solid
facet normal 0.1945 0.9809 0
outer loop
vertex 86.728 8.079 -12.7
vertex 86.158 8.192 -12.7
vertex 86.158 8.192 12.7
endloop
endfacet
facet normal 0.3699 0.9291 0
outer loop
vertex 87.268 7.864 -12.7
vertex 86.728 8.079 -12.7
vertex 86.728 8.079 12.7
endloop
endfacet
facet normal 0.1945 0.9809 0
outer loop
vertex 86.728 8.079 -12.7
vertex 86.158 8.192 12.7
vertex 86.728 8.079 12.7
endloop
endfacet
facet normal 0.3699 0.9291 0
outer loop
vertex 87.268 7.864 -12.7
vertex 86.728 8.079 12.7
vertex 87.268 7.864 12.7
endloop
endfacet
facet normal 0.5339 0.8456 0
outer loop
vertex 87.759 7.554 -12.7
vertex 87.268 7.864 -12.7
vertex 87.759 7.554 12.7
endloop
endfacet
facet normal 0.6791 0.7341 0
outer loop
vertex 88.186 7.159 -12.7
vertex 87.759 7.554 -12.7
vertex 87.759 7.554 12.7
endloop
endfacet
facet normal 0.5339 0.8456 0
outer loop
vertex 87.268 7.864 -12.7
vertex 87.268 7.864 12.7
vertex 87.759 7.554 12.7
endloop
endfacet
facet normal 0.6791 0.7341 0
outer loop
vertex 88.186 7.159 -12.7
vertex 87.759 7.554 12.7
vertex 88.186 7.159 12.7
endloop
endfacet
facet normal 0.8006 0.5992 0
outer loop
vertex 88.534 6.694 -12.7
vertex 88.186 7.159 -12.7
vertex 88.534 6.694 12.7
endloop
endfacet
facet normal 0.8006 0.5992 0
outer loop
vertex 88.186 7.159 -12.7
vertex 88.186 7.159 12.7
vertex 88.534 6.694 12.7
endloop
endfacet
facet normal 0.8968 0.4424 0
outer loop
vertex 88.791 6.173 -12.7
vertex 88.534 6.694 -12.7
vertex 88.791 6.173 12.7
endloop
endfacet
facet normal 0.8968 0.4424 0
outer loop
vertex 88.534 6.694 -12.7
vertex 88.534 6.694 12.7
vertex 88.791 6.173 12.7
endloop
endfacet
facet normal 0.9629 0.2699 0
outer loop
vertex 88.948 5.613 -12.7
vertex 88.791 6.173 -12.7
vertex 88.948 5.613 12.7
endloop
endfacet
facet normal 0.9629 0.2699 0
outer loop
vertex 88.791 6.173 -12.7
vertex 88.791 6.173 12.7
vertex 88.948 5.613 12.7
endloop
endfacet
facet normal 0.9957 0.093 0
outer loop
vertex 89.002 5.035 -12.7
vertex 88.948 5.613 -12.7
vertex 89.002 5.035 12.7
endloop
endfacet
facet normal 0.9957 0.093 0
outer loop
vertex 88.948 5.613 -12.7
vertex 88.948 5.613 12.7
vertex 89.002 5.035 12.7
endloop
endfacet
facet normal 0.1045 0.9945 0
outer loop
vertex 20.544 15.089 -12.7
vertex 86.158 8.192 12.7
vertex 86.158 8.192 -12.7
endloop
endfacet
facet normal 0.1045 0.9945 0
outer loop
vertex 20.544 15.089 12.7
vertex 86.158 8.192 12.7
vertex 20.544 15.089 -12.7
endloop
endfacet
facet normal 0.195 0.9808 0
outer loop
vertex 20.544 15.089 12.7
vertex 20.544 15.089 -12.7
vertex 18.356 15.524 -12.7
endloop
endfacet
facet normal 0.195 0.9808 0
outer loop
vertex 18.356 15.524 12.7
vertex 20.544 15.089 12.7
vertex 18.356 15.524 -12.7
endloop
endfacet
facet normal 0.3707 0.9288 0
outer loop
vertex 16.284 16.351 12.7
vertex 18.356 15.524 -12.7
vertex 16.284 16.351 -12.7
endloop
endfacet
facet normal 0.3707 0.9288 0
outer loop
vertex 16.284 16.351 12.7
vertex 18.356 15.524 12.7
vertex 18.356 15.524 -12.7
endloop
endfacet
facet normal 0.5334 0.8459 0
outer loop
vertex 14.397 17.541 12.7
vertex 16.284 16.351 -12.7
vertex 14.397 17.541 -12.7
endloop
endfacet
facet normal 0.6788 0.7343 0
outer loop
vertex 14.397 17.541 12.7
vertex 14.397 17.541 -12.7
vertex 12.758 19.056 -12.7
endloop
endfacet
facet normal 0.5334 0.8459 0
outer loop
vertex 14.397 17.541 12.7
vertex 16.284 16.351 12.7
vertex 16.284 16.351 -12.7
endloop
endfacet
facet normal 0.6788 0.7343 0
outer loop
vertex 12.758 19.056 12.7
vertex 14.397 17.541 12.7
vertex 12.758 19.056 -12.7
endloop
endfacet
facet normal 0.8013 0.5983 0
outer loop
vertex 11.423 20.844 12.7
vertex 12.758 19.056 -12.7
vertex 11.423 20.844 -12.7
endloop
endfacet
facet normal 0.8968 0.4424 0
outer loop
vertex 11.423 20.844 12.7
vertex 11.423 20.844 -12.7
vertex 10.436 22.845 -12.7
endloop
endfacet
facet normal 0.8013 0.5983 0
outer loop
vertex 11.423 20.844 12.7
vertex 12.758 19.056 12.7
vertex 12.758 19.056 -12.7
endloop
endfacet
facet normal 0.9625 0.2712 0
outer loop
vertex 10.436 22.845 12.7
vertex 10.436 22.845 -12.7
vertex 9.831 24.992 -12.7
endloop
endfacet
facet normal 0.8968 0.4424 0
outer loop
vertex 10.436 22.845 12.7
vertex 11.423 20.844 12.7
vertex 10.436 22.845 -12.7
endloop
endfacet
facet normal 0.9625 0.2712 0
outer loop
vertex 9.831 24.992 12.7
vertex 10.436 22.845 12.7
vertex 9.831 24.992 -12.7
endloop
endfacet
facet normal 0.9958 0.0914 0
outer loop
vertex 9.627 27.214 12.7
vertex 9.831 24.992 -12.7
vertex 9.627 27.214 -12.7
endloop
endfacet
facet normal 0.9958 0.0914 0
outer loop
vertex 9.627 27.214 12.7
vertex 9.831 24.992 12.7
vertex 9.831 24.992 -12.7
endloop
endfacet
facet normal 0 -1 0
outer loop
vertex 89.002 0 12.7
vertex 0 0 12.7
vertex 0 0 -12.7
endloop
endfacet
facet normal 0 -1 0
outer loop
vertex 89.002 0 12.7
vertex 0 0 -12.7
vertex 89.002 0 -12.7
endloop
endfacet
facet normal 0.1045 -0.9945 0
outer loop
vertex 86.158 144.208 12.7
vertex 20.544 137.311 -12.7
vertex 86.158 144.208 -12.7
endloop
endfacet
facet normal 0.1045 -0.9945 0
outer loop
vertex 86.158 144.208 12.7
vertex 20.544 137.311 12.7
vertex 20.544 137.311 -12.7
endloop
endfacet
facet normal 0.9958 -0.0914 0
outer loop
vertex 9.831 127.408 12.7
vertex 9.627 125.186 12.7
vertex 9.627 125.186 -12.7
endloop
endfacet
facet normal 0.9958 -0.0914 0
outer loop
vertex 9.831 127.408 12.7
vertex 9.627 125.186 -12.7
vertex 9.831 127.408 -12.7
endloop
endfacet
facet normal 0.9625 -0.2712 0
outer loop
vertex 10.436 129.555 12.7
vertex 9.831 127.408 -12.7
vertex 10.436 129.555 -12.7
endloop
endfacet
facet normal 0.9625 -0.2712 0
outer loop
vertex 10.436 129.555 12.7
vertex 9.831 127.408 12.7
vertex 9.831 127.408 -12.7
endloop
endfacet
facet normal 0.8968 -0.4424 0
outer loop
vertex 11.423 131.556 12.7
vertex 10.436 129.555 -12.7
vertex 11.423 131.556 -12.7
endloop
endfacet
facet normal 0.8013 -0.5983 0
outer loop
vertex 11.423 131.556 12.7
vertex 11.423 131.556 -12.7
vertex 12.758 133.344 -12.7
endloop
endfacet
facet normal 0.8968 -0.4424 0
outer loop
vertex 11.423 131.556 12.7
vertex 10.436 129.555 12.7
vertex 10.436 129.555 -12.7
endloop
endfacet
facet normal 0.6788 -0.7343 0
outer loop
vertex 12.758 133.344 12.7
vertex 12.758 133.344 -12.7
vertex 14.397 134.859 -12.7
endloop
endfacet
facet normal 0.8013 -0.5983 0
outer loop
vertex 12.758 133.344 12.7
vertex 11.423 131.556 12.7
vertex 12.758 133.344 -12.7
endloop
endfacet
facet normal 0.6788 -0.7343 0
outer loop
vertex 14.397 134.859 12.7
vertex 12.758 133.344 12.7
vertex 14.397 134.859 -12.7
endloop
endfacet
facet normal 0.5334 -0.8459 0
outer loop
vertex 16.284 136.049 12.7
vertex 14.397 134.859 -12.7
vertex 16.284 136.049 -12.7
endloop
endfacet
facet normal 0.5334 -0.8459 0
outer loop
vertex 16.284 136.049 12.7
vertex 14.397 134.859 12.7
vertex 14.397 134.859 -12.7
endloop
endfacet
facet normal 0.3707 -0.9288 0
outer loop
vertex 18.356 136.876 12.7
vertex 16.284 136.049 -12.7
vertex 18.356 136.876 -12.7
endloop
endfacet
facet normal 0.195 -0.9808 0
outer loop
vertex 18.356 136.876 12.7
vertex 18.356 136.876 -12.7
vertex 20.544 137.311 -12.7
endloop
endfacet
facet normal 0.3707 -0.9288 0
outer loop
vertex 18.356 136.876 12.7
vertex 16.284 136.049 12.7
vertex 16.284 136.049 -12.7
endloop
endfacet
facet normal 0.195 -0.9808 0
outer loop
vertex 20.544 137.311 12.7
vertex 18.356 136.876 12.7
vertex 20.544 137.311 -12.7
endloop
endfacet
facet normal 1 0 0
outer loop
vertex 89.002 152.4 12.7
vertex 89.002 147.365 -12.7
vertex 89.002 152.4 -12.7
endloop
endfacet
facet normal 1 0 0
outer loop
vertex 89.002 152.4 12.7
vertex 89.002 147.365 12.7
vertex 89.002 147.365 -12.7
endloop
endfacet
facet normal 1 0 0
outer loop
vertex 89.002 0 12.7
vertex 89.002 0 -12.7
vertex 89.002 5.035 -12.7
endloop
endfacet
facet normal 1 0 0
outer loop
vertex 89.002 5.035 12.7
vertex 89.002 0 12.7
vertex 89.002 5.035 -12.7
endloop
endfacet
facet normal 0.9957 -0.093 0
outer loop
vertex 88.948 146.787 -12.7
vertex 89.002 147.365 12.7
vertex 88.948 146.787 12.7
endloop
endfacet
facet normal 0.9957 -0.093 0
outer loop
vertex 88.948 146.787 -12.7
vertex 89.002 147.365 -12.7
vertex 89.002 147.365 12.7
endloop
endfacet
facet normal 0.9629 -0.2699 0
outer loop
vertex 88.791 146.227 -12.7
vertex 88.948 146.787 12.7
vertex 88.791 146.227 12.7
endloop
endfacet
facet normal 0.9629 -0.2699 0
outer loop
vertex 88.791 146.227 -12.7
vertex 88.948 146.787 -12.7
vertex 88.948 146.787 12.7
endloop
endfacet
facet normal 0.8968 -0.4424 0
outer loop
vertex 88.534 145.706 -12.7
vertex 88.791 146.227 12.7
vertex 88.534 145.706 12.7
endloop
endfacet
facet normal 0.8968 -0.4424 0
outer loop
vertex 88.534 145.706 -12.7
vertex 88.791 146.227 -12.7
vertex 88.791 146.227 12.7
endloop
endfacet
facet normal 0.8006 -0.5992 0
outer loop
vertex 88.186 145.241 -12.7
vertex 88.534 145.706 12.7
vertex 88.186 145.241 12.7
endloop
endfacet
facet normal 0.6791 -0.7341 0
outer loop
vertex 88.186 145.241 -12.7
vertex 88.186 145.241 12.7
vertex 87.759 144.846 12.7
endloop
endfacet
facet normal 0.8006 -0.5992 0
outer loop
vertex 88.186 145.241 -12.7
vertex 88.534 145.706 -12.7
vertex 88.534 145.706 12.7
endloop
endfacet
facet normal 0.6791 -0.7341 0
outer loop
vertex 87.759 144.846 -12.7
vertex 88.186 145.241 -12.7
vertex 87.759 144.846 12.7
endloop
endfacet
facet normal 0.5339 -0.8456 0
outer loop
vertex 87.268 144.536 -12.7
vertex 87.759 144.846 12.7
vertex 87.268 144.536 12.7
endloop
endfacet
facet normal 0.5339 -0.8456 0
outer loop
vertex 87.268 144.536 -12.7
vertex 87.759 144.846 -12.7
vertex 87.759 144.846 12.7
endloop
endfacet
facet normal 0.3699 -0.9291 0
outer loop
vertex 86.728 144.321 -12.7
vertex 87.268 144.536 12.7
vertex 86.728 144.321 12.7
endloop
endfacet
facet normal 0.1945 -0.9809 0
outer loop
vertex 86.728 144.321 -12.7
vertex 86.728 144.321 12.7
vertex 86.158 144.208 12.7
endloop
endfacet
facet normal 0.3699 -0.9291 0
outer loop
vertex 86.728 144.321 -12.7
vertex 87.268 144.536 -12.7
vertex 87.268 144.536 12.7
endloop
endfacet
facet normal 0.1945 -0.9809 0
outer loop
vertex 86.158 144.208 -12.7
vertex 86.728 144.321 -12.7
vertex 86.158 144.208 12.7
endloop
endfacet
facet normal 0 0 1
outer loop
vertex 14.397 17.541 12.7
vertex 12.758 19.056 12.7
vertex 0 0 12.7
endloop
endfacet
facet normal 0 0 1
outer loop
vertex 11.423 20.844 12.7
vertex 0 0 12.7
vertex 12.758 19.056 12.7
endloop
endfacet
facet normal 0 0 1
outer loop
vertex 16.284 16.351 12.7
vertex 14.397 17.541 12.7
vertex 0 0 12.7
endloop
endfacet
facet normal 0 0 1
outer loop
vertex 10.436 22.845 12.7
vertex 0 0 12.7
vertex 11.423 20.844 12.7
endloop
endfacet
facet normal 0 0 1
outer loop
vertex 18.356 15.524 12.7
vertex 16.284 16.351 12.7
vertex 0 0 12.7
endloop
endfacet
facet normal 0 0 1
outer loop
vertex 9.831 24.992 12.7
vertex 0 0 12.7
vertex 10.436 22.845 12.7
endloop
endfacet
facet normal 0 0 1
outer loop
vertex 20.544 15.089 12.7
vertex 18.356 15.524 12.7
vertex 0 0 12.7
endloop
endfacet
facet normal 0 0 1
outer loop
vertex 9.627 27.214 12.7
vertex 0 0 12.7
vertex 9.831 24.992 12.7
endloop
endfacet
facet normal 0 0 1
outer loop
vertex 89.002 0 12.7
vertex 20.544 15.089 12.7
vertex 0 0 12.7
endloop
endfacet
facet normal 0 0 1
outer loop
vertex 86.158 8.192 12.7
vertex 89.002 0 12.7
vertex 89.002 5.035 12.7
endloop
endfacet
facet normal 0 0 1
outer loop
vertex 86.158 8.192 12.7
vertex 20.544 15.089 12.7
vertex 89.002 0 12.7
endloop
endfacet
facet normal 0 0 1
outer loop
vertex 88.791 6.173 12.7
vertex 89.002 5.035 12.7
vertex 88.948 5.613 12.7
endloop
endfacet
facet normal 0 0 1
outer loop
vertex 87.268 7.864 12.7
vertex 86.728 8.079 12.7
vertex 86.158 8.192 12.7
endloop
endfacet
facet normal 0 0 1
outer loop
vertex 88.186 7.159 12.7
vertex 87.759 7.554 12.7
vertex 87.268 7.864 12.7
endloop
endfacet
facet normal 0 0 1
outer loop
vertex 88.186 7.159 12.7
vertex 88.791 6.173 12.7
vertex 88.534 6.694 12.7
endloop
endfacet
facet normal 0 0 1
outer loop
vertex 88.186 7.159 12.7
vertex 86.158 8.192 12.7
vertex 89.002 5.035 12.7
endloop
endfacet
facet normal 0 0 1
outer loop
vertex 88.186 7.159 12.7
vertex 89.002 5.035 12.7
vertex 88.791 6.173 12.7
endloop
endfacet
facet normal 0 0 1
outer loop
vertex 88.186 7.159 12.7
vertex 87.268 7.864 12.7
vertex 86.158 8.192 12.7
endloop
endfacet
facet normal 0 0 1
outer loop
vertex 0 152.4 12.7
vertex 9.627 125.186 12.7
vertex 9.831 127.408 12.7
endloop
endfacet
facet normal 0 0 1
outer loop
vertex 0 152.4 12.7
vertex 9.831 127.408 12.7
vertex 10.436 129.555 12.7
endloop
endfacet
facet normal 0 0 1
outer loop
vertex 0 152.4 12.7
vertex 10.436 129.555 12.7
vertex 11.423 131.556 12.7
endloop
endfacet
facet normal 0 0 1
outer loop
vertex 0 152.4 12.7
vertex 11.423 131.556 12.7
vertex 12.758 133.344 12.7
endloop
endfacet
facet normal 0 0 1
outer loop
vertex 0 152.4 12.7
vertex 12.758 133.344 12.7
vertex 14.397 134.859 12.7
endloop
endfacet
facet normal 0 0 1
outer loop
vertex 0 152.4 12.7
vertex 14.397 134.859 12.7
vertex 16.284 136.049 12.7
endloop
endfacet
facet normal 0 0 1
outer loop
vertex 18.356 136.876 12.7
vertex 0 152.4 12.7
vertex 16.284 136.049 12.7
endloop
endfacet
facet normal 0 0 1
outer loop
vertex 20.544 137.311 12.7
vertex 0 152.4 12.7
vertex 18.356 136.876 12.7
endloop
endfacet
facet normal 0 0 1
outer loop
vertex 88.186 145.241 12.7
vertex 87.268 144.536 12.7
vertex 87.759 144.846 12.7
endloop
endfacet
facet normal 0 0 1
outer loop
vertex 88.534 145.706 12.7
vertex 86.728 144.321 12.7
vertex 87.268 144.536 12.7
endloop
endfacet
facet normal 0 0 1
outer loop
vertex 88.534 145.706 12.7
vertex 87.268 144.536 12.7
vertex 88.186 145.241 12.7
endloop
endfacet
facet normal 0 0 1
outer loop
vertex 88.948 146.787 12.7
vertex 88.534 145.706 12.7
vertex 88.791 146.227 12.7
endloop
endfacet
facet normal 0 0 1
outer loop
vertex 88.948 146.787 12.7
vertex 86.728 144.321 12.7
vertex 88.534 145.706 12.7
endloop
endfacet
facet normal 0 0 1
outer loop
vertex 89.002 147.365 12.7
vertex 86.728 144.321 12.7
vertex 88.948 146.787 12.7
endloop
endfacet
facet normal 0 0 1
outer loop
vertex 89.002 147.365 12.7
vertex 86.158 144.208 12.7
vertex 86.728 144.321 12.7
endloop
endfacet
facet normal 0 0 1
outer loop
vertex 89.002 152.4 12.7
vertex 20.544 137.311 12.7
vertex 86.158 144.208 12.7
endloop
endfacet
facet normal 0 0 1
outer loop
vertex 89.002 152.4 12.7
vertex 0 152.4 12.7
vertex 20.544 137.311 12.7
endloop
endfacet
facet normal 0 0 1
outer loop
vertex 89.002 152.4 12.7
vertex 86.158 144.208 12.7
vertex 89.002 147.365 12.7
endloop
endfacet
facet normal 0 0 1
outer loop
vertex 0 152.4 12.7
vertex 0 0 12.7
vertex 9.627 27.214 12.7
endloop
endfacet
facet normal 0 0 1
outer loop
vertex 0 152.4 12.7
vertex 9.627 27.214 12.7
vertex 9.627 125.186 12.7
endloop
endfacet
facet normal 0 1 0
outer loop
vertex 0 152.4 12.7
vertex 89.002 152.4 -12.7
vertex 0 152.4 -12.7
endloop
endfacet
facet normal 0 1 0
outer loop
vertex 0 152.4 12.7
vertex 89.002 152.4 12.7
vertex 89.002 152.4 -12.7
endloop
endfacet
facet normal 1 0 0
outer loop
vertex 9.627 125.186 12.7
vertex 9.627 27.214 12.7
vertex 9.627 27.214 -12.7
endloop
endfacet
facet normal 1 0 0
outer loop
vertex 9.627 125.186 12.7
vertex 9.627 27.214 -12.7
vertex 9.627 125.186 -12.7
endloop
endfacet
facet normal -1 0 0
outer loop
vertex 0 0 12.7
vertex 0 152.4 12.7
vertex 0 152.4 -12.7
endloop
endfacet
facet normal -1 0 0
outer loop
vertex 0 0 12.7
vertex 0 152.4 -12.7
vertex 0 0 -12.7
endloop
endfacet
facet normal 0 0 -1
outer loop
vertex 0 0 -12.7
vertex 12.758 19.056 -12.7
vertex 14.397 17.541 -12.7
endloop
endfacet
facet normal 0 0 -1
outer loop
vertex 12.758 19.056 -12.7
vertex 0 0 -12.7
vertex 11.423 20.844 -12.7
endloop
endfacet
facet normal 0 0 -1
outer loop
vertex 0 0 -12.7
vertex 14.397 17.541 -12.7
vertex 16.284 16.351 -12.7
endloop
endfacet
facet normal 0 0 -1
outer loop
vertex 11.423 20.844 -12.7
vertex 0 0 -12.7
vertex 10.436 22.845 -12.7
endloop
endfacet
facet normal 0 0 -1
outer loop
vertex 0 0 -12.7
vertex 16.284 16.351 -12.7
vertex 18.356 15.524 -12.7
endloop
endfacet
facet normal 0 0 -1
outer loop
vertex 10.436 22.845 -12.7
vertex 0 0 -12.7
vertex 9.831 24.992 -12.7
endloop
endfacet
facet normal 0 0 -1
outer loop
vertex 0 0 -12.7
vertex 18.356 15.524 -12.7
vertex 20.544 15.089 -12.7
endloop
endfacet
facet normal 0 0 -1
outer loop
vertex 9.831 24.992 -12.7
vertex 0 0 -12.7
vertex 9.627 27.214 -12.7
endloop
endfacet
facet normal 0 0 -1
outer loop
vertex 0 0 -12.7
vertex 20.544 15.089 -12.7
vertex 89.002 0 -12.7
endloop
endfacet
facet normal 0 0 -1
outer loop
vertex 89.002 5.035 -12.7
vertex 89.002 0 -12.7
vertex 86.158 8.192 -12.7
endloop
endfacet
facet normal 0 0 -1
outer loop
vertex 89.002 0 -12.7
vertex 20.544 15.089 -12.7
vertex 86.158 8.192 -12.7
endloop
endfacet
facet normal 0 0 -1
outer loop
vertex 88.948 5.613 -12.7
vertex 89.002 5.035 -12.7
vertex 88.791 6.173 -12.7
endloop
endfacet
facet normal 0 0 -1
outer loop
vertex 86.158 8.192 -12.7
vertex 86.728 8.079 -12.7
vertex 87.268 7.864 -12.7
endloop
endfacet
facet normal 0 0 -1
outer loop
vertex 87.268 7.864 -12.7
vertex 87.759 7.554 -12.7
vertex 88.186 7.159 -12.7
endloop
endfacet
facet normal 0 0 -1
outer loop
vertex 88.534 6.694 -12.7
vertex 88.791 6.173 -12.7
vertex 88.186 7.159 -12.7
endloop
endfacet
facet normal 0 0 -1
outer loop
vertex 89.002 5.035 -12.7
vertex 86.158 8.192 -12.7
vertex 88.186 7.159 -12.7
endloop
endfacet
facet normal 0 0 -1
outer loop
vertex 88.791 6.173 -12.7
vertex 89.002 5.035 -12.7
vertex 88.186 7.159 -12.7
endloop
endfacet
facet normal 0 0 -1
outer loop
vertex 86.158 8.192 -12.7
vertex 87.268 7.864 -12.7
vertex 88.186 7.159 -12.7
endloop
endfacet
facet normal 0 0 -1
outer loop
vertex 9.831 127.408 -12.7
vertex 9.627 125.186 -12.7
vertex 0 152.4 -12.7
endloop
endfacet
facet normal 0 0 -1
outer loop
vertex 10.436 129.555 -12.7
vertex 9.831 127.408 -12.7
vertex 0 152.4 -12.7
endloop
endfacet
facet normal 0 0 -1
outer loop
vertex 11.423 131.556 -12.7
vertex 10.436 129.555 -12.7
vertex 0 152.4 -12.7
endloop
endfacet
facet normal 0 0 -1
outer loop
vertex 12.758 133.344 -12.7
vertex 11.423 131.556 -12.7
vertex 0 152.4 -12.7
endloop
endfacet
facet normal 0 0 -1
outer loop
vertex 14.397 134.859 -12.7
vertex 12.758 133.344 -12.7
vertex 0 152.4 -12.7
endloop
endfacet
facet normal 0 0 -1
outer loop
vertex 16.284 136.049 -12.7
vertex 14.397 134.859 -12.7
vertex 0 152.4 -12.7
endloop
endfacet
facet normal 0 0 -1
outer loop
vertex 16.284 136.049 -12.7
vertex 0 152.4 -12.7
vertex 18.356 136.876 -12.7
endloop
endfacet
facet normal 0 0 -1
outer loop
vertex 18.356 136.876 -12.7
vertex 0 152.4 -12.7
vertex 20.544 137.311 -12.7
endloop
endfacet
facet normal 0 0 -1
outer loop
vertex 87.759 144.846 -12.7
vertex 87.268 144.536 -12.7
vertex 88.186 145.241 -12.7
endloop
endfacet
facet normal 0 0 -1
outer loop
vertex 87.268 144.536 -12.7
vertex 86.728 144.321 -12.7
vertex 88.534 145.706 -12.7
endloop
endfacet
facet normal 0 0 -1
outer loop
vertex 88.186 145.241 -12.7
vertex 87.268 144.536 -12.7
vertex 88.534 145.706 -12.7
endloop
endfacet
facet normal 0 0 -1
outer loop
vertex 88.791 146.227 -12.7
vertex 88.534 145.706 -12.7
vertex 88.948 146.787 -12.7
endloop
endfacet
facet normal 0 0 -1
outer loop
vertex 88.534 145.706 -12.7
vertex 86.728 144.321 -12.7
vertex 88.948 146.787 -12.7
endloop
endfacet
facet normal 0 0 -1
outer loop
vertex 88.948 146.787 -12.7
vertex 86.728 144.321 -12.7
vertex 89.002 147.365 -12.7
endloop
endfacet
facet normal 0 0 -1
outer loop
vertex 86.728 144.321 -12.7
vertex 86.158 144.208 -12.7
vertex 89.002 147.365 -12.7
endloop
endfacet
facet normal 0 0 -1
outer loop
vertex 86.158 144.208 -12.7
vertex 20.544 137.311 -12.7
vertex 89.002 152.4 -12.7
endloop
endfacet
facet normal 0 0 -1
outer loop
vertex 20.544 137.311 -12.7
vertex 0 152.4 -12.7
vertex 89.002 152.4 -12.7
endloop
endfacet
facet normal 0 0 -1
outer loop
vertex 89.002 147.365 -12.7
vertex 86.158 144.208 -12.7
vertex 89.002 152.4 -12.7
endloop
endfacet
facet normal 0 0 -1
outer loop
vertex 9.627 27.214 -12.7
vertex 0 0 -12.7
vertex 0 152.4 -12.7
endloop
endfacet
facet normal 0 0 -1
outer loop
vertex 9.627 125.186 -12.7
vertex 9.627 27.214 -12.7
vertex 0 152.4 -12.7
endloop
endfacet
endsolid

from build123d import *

# Parameters (mm, degrees)
BASEMCHANNEL_DEPTH = 12.7
TOEFILLET_R        = 3.175


with BuildPart() as part:
    # Sketch1 → BaseMchannel (new body, symmetric)
    with BuildSketch(Plane.XY):
        with BuildLine():
            Line((89.0016, 152.4), (0, 152.4))
            Line((0, 152.4), (0, 0))
            Line((0, 0), (89.0016, 0))
            Line((89.0016, 0), (89.0016, 7.893675663))
            Line((89.0016, 7.893675663), (20.544188976, 15.088839497))
            ThreePointArc((20.544188976, 15.088839497), (12.758178288, 19.056010093), (9.6266, 27.214050446))
            Line((9.6266, 27.214050446), (9.6266, 125.185949554))
            ThreePointArc((9.6266, 125.185949554), (12.758178288, 133.343989907), (20.544188976, 137.311160503))
            Line((20.544188976, 137.311160503), (89.0016, 144.506324337))
            Line((89.0016, 144.506324337), (89.0016, 152.4))
        make_face()
    extrude(amount=BASEMCHANNEL_DEPTH, both=True)

    # ToeFillet
    toefillet_edges = [part.edges().sort_by_distance(p)[0] for p in [
        (89.0016, 144.506324337, 0),
        (89.0016, 7.893675663, 0),
    ]]
    fillet(toefillet_edges, radius=TOEFILLET_R)


solid = part.part
